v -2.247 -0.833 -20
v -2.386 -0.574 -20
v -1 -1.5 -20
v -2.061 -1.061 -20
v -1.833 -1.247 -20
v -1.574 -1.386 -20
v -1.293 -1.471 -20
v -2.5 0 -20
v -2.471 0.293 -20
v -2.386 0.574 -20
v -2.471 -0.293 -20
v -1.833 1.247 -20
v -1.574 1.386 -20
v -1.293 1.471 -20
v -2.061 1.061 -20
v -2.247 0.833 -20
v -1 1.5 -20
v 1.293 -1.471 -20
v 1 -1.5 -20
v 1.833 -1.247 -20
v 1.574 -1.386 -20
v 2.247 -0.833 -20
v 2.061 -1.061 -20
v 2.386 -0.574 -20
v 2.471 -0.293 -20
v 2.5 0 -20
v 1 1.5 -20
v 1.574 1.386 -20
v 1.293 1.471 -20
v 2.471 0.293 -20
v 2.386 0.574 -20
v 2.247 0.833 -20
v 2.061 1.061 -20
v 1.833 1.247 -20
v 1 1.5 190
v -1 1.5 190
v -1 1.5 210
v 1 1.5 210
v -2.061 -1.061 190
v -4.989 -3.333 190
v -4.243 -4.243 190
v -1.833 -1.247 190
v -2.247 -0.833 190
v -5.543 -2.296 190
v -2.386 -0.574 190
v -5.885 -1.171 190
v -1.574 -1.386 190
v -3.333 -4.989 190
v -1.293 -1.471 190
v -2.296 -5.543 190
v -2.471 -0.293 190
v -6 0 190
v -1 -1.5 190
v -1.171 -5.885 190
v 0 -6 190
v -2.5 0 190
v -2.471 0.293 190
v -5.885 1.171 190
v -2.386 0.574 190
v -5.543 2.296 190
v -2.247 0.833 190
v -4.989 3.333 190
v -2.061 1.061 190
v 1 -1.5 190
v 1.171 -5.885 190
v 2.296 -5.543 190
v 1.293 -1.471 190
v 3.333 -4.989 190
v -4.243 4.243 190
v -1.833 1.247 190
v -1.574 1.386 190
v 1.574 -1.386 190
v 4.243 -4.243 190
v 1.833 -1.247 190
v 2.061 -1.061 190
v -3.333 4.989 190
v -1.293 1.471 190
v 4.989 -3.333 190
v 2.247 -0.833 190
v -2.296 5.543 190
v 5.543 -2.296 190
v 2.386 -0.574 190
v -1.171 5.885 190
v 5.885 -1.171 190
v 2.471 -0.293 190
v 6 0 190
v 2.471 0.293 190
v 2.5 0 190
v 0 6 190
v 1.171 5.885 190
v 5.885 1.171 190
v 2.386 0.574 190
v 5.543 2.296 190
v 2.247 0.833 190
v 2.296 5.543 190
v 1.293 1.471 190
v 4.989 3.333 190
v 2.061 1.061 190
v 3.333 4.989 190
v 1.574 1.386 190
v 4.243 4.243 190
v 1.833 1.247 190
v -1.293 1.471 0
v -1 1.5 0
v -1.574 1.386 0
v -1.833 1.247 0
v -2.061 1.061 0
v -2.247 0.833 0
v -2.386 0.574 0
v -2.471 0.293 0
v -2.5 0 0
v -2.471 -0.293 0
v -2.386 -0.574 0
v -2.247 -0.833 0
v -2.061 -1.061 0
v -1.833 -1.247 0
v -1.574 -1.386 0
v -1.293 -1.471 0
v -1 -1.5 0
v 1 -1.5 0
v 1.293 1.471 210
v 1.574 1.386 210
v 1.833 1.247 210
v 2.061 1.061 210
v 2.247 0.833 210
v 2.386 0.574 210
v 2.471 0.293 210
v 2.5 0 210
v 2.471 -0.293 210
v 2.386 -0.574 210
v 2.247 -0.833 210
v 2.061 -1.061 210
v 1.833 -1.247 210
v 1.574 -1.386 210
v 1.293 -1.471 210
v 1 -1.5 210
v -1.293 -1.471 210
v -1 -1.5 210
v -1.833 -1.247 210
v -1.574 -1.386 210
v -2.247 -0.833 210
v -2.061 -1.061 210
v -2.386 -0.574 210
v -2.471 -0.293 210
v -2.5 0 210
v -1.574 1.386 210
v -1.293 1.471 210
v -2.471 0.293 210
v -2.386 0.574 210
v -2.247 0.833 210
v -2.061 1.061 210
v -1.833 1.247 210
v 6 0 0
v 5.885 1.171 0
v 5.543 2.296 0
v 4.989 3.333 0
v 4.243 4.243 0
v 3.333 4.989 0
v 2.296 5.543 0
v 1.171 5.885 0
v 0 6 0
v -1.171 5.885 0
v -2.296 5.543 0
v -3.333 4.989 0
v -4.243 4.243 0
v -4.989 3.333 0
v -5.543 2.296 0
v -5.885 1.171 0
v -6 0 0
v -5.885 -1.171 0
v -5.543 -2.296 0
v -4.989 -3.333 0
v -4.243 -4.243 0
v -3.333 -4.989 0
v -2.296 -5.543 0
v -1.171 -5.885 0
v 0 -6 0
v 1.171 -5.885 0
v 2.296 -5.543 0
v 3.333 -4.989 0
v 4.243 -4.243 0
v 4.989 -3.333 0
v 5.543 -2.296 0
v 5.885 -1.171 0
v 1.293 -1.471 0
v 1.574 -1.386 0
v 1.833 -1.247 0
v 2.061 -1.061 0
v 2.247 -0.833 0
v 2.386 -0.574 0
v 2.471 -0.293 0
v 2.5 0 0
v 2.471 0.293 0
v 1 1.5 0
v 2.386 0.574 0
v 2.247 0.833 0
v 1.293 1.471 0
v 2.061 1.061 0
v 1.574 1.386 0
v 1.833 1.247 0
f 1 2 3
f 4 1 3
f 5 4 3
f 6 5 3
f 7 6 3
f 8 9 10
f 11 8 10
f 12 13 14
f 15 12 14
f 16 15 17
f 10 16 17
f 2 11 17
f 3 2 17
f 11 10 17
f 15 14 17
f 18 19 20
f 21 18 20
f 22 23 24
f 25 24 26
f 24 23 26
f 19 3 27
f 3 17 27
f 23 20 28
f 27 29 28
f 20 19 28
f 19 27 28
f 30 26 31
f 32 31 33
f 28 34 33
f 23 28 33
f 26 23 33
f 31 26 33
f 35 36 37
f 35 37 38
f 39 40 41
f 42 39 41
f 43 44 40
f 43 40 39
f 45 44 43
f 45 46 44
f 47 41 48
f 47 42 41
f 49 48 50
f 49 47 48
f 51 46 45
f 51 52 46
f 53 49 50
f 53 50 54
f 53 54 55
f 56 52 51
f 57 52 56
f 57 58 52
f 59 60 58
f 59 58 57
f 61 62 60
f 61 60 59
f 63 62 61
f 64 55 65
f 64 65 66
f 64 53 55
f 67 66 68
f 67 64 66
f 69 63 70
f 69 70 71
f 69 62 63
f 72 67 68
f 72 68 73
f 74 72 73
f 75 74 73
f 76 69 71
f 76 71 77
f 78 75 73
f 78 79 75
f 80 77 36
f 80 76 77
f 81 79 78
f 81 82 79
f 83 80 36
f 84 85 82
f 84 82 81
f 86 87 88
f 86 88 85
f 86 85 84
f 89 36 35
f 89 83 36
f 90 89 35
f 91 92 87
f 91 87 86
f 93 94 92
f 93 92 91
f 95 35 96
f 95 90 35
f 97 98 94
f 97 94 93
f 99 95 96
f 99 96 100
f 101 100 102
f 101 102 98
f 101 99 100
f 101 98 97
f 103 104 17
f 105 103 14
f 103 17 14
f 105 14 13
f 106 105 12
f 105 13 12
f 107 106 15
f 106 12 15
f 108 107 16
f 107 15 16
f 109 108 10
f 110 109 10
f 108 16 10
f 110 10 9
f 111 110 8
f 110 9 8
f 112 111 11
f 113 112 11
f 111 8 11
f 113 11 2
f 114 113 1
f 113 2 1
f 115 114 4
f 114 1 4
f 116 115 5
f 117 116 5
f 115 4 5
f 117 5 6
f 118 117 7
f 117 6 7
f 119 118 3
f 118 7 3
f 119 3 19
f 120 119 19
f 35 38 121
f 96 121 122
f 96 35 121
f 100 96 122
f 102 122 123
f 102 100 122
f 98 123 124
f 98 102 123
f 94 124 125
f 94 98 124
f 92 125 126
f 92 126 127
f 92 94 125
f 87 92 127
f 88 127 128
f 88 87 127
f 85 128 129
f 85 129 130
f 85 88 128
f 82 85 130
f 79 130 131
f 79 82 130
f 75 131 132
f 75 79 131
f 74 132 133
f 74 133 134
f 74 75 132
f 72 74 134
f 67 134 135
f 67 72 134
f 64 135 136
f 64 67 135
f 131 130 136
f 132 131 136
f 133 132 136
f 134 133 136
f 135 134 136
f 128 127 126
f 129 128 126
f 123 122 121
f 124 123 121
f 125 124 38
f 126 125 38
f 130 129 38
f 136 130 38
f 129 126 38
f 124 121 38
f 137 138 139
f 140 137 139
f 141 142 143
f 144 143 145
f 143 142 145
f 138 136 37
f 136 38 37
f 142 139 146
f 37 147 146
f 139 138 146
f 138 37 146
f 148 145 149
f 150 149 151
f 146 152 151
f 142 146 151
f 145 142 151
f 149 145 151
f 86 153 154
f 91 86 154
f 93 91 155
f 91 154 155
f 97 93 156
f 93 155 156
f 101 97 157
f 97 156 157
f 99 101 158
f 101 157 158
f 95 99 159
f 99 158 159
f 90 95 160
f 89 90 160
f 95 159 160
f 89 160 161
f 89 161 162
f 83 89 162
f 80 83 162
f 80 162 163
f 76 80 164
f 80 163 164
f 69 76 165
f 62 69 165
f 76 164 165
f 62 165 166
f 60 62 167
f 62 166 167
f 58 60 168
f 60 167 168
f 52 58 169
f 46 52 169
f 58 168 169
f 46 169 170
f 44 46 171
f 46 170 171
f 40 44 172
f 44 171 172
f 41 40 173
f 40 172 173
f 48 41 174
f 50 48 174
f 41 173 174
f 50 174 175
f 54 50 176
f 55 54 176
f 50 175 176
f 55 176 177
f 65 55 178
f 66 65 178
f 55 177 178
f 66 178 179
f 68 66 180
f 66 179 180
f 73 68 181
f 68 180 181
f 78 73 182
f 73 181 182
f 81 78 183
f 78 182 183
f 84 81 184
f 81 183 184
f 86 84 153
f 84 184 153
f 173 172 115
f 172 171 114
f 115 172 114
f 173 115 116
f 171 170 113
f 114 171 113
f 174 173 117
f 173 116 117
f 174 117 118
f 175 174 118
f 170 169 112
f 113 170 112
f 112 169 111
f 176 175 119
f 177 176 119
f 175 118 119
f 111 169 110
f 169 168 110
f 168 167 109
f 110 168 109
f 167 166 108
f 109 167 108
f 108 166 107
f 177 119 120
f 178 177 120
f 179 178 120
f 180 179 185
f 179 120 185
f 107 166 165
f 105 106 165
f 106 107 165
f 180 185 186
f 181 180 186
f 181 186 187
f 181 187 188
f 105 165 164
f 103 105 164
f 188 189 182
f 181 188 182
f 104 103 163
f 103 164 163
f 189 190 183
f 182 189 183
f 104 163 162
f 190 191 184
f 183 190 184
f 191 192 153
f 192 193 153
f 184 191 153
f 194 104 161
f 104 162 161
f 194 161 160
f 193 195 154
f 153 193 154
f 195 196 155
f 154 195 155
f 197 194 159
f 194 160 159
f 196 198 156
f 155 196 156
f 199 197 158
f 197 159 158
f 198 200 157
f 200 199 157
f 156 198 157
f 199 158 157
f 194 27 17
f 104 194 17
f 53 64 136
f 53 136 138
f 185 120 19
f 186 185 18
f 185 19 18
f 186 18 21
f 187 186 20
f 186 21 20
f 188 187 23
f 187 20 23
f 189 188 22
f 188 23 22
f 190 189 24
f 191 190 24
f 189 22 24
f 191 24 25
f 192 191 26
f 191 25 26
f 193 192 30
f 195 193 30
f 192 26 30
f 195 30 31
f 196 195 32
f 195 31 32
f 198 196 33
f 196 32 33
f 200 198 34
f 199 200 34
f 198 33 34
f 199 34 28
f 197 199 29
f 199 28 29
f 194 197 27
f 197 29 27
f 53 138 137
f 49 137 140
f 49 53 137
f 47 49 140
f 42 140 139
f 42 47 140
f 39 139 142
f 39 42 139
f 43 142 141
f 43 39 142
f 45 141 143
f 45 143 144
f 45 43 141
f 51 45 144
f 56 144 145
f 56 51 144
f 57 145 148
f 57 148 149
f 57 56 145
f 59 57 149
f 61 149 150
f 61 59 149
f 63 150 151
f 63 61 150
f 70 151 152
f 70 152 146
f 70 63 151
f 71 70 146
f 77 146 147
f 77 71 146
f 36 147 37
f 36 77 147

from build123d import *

# Parameters (mm, degrees)
ESQUISSE1_R        = 6
BOSS_EXTRU_1_DEPTH = 190
BOSS_EXTRU_2_DEPTH = 20
BOSS_EXTRU_3_START = 20
BOSS_EXTRU_3_DEPTH = 20


with BuildPart() as part:
    # Esquisse1 → Boss.-Extru.1 (new body)
    with BuildSketch(Plane.XY):
        Circle(ESQUISSE1_R)
    extrude(amount=BOSS_EXTRU_1_DEPTH)

    # Esquisse2 → Boss.-Extru.2 (add)
    with BuildSketch(Plane.XY.offset(190)):
        with BuildLine():
            Line((-1, 1.5), (1, 1.5))
            ThreePointArc((1, 1.5), (2.5, 0), (1, -1.5))
            Line((1, -1.5), (-1, -1.5))
            ThreePointArc((-1, -1.5), (-2.5, 0), (-1, 1.5))
        make_face()
    extrude(amount=BOSS_EXTRU_2_DEPTH)

    # Esquisse3 → Boss.-Extru.3 (add)
    with BuildSketch(Plane(origin=(0, 0, 0), x_dir=(-1, 0, 0), z_dir=(0, 0, -1)).offset(BOSS_EXTRU_3_START)):
        with BuildLine():
            Line((-1, 1.5), (1, 1.5))
            ThreePointArc((1, 1.5), (2.5, 0), (1, -1.5))
            Line((1, -1.5), (-1, -1.5))
            ThreePointArc((-1, -1.5), (-2.5, 0), (-1, 1.5))
        make_face()
    extrude(amount=-BOSS_EXTRU_3_DEPTH)


solid = part.part
